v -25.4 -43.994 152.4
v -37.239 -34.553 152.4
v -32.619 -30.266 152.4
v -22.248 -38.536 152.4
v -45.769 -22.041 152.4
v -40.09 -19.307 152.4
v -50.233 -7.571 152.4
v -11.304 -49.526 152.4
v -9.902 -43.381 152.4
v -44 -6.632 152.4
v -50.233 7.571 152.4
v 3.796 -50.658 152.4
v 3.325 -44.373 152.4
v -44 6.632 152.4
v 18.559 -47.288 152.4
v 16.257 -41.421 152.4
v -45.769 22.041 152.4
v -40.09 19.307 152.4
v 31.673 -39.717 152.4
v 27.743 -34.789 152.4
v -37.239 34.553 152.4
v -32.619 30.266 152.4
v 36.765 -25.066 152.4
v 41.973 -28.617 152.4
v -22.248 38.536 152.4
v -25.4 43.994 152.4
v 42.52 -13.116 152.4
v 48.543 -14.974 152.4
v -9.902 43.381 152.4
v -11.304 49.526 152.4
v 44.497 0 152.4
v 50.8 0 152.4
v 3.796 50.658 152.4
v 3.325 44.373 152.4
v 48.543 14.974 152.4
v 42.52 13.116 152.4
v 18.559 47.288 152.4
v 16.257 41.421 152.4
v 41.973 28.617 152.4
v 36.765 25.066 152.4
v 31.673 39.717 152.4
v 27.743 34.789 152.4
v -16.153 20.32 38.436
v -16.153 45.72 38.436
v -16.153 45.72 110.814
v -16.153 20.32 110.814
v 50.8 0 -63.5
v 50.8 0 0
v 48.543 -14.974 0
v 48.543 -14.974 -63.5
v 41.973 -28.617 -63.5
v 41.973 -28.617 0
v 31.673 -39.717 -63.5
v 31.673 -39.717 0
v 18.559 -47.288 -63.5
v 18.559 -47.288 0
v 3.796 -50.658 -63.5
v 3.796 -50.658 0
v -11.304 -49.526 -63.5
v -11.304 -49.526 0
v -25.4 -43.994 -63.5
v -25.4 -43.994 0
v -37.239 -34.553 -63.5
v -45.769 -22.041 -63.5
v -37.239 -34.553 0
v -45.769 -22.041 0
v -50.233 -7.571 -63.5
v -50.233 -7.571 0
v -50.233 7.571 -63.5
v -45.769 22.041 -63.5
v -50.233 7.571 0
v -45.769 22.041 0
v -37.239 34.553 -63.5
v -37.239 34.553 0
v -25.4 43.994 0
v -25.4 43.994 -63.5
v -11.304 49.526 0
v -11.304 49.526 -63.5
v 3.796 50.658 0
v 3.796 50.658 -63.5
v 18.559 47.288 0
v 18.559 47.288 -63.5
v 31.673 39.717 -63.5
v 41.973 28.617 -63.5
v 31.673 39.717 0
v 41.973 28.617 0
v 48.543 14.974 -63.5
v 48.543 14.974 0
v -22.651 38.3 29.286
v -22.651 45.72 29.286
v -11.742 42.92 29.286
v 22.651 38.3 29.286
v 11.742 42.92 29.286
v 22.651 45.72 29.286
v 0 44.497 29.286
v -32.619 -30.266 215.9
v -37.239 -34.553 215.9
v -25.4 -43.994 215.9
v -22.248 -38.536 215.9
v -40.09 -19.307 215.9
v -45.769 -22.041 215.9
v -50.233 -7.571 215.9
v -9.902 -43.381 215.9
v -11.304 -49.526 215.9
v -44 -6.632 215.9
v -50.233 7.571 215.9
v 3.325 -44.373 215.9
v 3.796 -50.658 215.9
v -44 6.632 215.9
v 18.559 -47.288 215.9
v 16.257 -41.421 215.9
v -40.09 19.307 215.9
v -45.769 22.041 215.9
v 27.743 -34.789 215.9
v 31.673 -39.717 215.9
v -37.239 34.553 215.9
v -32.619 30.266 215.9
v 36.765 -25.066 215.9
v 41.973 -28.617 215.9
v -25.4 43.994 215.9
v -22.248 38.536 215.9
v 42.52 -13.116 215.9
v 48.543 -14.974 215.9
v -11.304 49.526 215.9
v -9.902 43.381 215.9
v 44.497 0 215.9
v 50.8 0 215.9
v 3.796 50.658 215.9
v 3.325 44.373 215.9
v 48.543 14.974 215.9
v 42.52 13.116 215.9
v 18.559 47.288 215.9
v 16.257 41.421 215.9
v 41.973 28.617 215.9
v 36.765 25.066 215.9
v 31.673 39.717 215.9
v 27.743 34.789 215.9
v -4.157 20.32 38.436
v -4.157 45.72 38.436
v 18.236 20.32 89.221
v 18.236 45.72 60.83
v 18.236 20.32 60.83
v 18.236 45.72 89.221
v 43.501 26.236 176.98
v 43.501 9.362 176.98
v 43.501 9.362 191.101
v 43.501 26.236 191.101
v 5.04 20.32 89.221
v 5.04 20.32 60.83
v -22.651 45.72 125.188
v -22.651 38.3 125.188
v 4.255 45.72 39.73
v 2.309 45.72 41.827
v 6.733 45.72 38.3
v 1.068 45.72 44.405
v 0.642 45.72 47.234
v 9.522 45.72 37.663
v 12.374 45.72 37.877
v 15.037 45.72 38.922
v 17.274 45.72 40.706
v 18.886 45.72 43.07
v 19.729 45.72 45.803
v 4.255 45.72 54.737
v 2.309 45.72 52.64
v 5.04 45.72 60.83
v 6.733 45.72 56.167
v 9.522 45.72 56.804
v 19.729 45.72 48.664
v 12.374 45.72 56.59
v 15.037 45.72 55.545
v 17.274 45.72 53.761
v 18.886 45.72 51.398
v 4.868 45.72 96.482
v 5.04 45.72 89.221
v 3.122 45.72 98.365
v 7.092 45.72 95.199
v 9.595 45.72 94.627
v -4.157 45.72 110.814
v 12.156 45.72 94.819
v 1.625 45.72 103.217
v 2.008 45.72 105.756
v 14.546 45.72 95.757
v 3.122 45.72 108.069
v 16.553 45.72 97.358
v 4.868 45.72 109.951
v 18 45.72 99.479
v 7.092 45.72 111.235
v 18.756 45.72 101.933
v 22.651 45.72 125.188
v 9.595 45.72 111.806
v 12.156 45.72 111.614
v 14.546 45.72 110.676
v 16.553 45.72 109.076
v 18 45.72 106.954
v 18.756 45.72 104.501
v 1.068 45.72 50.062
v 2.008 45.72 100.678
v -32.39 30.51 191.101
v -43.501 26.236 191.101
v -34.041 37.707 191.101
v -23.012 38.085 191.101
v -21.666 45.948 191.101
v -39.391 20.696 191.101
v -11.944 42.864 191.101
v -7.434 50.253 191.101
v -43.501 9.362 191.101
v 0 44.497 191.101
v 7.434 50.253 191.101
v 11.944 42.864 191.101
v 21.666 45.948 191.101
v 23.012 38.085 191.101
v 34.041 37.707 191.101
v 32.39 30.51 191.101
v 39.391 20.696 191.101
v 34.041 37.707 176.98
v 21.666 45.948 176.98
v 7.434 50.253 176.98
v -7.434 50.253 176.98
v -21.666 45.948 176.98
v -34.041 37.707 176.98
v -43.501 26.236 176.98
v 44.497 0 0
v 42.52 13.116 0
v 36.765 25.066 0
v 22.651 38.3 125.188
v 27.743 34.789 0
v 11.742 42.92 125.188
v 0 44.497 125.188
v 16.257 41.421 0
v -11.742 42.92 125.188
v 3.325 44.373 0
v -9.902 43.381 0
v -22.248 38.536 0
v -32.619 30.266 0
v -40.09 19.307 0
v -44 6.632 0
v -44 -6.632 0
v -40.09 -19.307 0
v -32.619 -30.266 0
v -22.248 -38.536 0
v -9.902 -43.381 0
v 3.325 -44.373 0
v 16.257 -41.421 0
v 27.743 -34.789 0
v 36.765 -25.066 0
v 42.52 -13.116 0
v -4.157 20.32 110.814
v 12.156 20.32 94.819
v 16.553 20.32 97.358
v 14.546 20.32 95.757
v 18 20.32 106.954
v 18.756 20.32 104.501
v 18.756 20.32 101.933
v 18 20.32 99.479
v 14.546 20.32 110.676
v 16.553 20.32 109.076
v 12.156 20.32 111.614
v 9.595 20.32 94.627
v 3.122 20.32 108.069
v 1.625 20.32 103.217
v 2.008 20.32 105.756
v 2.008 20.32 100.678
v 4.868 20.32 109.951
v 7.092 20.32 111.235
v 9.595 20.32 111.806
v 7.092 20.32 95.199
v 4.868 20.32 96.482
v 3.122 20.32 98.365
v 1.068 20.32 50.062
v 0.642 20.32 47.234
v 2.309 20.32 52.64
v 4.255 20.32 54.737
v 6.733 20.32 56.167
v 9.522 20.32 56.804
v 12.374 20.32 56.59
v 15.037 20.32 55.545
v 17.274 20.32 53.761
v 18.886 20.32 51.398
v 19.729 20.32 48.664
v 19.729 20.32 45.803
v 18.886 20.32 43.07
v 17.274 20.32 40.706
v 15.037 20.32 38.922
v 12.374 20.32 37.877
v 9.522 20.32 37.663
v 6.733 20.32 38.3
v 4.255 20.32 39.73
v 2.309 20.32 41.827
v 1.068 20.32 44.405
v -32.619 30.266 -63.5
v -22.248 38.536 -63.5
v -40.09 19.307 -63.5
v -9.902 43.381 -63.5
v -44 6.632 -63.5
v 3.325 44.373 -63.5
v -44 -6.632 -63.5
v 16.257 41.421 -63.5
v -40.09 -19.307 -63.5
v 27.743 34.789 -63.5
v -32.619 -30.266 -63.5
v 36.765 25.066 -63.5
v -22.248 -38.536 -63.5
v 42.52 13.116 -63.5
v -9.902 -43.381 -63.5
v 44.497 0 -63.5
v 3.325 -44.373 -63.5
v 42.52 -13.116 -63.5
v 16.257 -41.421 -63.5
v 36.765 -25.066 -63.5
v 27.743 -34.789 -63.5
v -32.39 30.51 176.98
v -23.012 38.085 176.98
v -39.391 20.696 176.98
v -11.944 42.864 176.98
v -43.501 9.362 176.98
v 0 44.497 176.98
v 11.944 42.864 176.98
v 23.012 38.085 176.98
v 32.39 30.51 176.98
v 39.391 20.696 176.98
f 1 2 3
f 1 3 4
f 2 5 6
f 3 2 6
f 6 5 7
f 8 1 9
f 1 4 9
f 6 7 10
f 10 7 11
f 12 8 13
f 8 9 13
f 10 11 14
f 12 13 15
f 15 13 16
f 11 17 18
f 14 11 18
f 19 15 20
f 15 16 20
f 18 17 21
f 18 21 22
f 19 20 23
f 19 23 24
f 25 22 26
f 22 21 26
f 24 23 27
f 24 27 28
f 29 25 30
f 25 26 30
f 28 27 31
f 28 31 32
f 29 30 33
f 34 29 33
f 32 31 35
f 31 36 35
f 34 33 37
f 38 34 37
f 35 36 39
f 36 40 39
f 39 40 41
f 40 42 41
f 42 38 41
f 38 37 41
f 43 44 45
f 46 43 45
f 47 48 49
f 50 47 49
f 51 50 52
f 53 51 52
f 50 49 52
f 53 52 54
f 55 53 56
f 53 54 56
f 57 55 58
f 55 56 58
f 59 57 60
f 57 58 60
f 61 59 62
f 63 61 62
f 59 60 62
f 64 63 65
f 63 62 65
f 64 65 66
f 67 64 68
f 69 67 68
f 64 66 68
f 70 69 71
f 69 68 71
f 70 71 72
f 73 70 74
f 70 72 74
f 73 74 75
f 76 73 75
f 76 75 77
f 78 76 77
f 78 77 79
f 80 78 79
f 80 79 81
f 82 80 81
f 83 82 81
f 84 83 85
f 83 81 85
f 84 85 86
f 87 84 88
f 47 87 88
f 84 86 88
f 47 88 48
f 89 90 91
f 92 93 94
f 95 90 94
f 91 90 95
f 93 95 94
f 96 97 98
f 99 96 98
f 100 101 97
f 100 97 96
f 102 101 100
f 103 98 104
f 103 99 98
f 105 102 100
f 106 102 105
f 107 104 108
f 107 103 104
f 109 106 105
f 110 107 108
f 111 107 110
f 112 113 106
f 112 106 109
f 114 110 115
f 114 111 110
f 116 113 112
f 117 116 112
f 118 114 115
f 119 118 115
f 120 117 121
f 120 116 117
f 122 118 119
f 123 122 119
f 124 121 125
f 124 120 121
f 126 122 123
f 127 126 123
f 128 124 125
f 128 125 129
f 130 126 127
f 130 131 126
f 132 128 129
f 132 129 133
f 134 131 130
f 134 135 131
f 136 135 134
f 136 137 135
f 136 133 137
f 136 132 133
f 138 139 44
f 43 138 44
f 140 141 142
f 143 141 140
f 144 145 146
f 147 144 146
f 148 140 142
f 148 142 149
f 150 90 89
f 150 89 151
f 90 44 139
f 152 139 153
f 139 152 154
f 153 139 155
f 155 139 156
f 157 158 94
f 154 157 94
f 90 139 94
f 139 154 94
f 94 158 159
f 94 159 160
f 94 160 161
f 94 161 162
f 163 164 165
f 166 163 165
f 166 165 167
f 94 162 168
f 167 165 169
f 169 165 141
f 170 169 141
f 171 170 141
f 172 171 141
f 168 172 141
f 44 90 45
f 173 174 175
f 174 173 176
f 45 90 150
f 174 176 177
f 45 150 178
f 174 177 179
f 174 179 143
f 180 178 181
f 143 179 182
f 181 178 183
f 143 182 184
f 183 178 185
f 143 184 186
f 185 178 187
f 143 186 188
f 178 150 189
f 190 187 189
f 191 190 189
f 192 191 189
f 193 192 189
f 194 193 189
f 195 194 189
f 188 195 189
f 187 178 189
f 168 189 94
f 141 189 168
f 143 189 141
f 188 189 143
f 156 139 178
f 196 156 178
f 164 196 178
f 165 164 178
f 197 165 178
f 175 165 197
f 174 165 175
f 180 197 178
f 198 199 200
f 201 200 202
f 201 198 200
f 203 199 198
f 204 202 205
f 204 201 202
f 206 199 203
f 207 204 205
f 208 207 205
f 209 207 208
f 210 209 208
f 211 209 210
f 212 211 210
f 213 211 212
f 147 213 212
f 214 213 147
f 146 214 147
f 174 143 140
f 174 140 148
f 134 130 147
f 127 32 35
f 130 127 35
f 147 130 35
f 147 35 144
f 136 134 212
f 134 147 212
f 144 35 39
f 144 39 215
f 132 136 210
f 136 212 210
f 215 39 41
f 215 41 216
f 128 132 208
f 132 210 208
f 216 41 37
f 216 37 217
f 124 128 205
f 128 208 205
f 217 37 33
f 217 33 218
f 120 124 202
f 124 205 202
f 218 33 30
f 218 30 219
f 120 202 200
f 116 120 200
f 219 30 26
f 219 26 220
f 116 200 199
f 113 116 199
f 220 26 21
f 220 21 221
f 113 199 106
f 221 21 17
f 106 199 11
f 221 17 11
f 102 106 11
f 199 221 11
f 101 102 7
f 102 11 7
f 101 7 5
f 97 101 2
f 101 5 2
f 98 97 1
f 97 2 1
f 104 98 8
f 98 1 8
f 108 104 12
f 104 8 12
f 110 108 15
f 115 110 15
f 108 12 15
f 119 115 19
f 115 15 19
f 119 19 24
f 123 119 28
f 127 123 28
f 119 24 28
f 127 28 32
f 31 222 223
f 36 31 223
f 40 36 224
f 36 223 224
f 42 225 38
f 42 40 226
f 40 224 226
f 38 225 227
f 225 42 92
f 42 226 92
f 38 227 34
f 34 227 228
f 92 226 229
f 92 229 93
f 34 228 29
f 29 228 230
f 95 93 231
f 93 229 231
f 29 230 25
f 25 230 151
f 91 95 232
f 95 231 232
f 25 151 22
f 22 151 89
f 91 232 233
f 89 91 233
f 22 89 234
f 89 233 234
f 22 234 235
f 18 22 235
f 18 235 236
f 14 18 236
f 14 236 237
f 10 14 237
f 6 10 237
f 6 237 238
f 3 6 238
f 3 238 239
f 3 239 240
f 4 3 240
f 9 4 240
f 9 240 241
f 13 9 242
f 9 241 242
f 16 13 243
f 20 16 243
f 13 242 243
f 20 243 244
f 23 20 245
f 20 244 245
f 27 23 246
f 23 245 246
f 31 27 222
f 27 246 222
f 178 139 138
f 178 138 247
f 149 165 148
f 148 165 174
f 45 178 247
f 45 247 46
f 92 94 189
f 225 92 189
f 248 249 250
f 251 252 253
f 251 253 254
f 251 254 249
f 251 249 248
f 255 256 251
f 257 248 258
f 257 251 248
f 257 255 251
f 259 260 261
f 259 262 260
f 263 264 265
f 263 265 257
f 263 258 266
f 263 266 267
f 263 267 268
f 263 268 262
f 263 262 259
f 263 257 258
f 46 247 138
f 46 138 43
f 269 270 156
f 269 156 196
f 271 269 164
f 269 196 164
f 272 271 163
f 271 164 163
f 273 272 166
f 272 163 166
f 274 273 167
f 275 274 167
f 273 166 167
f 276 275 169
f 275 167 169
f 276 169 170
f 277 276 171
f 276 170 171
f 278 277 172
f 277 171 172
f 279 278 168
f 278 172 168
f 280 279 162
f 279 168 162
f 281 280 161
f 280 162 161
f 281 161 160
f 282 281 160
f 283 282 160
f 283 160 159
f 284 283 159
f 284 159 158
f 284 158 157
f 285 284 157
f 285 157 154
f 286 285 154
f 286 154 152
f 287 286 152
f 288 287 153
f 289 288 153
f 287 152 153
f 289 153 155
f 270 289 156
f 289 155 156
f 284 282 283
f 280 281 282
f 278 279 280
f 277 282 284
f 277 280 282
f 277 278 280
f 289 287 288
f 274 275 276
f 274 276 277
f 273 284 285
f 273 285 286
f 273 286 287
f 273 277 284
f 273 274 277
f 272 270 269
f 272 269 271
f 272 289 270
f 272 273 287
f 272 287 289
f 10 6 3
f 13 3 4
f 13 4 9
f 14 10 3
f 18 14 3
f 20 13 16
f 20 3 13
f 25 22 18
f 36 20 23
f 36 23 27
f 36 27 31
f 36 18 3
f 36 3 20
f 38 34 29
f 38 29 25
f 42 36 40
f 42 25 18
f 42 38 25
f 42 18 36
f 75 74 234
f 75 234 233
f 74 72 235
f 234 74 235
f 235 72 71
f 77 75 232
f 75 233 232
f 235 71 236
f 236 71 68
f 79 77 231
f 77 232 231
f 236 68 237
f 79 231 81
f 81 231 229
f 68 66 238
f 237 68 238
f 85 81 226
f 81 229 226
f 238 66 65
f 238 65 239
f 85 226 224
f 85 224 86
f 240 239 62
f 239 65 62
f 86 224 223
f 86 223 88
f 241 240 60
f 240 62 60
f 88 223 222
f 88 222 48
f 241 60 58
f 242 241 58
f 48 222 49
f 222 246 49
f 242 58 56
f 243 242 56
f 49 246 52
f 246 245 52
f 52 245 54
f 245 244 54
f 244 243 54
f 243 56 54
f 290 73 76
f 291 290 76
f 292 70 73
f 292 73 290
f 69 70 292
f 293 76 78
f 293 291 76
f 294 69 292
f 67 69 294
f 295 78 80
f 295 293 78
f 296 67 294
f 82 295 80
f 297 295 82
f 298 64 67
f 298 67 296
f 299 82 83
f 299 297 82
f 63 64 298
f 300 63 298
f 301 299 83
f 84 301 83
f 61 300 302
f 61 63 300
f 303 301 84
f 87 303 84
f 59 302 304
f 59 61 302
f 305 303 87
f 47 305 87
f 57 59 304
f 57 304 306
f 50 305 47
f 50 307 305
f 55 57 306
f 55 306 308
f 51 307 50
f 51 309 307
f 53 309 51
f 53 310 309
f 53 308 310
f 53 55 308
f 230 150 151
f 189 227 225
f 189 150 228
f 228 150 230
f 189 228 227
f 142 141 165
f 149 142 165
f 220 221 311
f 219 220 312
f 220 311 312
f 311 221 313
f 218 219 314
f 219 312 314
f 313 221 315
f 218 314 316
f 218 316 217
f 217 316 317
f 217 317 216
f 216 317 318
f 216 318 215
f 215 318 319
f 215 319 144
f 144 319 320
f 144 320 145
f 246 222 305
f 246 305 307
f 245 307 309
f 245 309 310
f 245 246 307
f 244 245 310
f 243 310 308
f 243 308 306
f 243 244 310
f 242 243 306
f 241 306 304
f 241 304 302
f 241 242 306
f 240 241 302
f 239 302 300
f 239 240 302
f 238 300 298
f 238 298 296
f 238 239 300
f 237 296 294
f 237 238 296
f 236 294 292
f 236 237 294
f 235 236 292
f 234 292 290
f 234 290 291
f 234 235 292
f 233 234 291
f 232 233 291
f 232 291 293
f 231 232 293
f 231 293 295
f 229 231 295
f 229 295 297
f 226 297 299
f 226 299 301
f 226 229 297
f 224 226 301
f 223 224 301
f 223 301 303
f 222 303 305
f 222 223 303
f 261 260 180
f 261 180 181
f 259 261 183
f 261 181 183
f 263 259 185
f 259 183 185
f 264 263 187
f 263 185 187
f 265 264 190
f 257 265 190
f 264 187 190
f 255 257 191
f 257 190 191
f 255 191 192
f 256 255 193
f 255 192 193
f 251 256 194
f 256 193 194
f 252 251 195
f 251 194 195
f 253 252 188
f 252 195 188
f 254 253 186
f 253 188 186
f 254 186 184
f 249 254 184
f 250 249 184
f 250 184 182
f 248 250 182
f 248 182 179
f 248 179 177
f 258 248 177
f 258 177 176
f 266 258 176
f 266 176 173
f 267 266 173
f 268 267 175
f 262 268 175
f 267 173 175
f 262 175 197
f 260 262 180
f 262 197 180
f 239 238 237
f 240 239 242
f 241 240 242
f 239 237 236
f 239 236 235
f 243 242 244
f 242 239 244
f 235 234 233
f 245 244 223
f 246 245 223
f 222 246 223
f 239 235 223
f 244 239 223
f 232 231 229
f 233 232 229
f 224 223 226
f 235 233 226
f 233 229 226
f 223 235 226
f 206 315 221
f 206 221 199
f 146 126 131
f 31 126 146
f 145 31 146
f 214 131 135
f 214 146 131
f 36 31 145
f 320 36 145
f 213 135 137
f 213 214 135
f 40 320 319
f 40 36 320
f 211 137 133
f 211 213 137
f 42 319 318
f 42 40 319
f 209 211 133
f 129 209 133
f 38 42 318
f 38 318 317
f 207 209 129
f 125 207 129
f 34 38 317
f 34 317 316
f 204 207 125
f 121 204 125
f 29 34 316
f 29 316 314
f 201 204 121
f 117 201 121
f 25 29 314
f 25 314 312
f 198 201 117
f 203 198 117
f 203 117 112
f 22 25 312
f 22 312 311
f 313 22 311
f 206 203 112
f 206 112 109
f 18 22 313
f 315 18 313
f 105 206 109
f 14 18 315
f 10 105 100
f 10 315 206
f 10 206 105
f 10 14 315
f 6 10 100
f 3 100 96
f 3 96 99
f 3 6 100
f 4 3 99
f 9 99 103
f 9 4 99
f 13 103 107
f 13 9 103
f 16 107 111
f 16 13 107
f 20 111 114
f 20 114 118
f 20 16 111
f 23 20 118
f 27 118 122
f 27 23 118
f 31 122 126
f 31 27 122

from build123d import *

# Parameters (mm, degrees)
F0_R      = 44.496964
F1_DEPTH  = 152.4
F2_R      = 50.8
F2_R_2    = 44.496964
F3_DEPTH  = 63.5
F4_R      = 50.8
F4_R_2    = 44.496964
F5_DEPTH  = 63.5
F6_W      = 87.001756
F6_H      = 14.120966
F7_DEPTH  = 66.294
F9_W      = 45.30283
F9_H      = 95.901433
F10_DEPTH = 25.4
F11_R     = 8.613658
F11_R_2   = 9.597104
F11_W     = 13.196016
F11_H     = 28.391429
F11_W_2   = 11.996375
F11_H_2   = 72.378151
F12_DEPTH = 25.4


with BuildPart() as f1:
    # F0 (on Top) → F1 (new body)
    with BuildSketch(Plane.XY):
        Circle(F0_R)
    extrude(amount=F1_DEPTH)

    # F9 (on offset) → F10 (join)
    with BuildSketch(Plane.XZ.offset(-45.72)):
        with Locations((0, 77.236965)):
            Rectangle(F9_W, F9_H)
    extrude(amount=F10_DEPTH)

    # F11 (on face) → F12 (cut)
    with BuildSketch(Plane(origin=(0, 45.72, 0), x_dir=(-1, 0, 0), z_dir=(0, 1, 0))):
        with Locations((-10.238909, 103.216775)):
            Circle(F11_R)
        with Locations((-10.238909, 47.233675)):
            Circle(F11_R_2)
        with Locations((-11.638488, 75.025286)):
            Rectangle(F11_W, F11_H)
        with Locations((10.154933, 74.625406)):
            Rectangle(F11_W_2, F11_H_2)
    extrude(amount=-F12_DEPTH, mode=Mode.SUBTRACT)


with BuildPart() as f3:
    # F2 (on face) → F3 (new body)
    with BuildSketch(Plane(origin=(0, 0, 0), x_dir=(1, 0, 0), z_dir=(0, 0, -1))):
        Circle(F2_R)
        Circle(F2_R_2, mode=Mode.SUBTRACT)
    extrude(amount=F3_DEPTH)


with BuildPart() as f5:
    # F4 (on face) → F5 (new body)
    with BuildSketch(Plane.XY.offset(152.4)):
        Circle(F4_R)
        Circle(F4_R_2, mode=Mode.SUBTRACT)
    extrude(amount=F5_DEPTH)

    # F6 (on Front) → F7 (cut)
    with BuildSketch(Plane.XZ):
        with Locations((0, 184.040651)):
            Rectangle(F6_W, F6_H)
    extrude(amount=-F7_DEPTH, mode=Mode.SUBTRACT)


solid = Compound([f1.part, f3.part, f5.part])
